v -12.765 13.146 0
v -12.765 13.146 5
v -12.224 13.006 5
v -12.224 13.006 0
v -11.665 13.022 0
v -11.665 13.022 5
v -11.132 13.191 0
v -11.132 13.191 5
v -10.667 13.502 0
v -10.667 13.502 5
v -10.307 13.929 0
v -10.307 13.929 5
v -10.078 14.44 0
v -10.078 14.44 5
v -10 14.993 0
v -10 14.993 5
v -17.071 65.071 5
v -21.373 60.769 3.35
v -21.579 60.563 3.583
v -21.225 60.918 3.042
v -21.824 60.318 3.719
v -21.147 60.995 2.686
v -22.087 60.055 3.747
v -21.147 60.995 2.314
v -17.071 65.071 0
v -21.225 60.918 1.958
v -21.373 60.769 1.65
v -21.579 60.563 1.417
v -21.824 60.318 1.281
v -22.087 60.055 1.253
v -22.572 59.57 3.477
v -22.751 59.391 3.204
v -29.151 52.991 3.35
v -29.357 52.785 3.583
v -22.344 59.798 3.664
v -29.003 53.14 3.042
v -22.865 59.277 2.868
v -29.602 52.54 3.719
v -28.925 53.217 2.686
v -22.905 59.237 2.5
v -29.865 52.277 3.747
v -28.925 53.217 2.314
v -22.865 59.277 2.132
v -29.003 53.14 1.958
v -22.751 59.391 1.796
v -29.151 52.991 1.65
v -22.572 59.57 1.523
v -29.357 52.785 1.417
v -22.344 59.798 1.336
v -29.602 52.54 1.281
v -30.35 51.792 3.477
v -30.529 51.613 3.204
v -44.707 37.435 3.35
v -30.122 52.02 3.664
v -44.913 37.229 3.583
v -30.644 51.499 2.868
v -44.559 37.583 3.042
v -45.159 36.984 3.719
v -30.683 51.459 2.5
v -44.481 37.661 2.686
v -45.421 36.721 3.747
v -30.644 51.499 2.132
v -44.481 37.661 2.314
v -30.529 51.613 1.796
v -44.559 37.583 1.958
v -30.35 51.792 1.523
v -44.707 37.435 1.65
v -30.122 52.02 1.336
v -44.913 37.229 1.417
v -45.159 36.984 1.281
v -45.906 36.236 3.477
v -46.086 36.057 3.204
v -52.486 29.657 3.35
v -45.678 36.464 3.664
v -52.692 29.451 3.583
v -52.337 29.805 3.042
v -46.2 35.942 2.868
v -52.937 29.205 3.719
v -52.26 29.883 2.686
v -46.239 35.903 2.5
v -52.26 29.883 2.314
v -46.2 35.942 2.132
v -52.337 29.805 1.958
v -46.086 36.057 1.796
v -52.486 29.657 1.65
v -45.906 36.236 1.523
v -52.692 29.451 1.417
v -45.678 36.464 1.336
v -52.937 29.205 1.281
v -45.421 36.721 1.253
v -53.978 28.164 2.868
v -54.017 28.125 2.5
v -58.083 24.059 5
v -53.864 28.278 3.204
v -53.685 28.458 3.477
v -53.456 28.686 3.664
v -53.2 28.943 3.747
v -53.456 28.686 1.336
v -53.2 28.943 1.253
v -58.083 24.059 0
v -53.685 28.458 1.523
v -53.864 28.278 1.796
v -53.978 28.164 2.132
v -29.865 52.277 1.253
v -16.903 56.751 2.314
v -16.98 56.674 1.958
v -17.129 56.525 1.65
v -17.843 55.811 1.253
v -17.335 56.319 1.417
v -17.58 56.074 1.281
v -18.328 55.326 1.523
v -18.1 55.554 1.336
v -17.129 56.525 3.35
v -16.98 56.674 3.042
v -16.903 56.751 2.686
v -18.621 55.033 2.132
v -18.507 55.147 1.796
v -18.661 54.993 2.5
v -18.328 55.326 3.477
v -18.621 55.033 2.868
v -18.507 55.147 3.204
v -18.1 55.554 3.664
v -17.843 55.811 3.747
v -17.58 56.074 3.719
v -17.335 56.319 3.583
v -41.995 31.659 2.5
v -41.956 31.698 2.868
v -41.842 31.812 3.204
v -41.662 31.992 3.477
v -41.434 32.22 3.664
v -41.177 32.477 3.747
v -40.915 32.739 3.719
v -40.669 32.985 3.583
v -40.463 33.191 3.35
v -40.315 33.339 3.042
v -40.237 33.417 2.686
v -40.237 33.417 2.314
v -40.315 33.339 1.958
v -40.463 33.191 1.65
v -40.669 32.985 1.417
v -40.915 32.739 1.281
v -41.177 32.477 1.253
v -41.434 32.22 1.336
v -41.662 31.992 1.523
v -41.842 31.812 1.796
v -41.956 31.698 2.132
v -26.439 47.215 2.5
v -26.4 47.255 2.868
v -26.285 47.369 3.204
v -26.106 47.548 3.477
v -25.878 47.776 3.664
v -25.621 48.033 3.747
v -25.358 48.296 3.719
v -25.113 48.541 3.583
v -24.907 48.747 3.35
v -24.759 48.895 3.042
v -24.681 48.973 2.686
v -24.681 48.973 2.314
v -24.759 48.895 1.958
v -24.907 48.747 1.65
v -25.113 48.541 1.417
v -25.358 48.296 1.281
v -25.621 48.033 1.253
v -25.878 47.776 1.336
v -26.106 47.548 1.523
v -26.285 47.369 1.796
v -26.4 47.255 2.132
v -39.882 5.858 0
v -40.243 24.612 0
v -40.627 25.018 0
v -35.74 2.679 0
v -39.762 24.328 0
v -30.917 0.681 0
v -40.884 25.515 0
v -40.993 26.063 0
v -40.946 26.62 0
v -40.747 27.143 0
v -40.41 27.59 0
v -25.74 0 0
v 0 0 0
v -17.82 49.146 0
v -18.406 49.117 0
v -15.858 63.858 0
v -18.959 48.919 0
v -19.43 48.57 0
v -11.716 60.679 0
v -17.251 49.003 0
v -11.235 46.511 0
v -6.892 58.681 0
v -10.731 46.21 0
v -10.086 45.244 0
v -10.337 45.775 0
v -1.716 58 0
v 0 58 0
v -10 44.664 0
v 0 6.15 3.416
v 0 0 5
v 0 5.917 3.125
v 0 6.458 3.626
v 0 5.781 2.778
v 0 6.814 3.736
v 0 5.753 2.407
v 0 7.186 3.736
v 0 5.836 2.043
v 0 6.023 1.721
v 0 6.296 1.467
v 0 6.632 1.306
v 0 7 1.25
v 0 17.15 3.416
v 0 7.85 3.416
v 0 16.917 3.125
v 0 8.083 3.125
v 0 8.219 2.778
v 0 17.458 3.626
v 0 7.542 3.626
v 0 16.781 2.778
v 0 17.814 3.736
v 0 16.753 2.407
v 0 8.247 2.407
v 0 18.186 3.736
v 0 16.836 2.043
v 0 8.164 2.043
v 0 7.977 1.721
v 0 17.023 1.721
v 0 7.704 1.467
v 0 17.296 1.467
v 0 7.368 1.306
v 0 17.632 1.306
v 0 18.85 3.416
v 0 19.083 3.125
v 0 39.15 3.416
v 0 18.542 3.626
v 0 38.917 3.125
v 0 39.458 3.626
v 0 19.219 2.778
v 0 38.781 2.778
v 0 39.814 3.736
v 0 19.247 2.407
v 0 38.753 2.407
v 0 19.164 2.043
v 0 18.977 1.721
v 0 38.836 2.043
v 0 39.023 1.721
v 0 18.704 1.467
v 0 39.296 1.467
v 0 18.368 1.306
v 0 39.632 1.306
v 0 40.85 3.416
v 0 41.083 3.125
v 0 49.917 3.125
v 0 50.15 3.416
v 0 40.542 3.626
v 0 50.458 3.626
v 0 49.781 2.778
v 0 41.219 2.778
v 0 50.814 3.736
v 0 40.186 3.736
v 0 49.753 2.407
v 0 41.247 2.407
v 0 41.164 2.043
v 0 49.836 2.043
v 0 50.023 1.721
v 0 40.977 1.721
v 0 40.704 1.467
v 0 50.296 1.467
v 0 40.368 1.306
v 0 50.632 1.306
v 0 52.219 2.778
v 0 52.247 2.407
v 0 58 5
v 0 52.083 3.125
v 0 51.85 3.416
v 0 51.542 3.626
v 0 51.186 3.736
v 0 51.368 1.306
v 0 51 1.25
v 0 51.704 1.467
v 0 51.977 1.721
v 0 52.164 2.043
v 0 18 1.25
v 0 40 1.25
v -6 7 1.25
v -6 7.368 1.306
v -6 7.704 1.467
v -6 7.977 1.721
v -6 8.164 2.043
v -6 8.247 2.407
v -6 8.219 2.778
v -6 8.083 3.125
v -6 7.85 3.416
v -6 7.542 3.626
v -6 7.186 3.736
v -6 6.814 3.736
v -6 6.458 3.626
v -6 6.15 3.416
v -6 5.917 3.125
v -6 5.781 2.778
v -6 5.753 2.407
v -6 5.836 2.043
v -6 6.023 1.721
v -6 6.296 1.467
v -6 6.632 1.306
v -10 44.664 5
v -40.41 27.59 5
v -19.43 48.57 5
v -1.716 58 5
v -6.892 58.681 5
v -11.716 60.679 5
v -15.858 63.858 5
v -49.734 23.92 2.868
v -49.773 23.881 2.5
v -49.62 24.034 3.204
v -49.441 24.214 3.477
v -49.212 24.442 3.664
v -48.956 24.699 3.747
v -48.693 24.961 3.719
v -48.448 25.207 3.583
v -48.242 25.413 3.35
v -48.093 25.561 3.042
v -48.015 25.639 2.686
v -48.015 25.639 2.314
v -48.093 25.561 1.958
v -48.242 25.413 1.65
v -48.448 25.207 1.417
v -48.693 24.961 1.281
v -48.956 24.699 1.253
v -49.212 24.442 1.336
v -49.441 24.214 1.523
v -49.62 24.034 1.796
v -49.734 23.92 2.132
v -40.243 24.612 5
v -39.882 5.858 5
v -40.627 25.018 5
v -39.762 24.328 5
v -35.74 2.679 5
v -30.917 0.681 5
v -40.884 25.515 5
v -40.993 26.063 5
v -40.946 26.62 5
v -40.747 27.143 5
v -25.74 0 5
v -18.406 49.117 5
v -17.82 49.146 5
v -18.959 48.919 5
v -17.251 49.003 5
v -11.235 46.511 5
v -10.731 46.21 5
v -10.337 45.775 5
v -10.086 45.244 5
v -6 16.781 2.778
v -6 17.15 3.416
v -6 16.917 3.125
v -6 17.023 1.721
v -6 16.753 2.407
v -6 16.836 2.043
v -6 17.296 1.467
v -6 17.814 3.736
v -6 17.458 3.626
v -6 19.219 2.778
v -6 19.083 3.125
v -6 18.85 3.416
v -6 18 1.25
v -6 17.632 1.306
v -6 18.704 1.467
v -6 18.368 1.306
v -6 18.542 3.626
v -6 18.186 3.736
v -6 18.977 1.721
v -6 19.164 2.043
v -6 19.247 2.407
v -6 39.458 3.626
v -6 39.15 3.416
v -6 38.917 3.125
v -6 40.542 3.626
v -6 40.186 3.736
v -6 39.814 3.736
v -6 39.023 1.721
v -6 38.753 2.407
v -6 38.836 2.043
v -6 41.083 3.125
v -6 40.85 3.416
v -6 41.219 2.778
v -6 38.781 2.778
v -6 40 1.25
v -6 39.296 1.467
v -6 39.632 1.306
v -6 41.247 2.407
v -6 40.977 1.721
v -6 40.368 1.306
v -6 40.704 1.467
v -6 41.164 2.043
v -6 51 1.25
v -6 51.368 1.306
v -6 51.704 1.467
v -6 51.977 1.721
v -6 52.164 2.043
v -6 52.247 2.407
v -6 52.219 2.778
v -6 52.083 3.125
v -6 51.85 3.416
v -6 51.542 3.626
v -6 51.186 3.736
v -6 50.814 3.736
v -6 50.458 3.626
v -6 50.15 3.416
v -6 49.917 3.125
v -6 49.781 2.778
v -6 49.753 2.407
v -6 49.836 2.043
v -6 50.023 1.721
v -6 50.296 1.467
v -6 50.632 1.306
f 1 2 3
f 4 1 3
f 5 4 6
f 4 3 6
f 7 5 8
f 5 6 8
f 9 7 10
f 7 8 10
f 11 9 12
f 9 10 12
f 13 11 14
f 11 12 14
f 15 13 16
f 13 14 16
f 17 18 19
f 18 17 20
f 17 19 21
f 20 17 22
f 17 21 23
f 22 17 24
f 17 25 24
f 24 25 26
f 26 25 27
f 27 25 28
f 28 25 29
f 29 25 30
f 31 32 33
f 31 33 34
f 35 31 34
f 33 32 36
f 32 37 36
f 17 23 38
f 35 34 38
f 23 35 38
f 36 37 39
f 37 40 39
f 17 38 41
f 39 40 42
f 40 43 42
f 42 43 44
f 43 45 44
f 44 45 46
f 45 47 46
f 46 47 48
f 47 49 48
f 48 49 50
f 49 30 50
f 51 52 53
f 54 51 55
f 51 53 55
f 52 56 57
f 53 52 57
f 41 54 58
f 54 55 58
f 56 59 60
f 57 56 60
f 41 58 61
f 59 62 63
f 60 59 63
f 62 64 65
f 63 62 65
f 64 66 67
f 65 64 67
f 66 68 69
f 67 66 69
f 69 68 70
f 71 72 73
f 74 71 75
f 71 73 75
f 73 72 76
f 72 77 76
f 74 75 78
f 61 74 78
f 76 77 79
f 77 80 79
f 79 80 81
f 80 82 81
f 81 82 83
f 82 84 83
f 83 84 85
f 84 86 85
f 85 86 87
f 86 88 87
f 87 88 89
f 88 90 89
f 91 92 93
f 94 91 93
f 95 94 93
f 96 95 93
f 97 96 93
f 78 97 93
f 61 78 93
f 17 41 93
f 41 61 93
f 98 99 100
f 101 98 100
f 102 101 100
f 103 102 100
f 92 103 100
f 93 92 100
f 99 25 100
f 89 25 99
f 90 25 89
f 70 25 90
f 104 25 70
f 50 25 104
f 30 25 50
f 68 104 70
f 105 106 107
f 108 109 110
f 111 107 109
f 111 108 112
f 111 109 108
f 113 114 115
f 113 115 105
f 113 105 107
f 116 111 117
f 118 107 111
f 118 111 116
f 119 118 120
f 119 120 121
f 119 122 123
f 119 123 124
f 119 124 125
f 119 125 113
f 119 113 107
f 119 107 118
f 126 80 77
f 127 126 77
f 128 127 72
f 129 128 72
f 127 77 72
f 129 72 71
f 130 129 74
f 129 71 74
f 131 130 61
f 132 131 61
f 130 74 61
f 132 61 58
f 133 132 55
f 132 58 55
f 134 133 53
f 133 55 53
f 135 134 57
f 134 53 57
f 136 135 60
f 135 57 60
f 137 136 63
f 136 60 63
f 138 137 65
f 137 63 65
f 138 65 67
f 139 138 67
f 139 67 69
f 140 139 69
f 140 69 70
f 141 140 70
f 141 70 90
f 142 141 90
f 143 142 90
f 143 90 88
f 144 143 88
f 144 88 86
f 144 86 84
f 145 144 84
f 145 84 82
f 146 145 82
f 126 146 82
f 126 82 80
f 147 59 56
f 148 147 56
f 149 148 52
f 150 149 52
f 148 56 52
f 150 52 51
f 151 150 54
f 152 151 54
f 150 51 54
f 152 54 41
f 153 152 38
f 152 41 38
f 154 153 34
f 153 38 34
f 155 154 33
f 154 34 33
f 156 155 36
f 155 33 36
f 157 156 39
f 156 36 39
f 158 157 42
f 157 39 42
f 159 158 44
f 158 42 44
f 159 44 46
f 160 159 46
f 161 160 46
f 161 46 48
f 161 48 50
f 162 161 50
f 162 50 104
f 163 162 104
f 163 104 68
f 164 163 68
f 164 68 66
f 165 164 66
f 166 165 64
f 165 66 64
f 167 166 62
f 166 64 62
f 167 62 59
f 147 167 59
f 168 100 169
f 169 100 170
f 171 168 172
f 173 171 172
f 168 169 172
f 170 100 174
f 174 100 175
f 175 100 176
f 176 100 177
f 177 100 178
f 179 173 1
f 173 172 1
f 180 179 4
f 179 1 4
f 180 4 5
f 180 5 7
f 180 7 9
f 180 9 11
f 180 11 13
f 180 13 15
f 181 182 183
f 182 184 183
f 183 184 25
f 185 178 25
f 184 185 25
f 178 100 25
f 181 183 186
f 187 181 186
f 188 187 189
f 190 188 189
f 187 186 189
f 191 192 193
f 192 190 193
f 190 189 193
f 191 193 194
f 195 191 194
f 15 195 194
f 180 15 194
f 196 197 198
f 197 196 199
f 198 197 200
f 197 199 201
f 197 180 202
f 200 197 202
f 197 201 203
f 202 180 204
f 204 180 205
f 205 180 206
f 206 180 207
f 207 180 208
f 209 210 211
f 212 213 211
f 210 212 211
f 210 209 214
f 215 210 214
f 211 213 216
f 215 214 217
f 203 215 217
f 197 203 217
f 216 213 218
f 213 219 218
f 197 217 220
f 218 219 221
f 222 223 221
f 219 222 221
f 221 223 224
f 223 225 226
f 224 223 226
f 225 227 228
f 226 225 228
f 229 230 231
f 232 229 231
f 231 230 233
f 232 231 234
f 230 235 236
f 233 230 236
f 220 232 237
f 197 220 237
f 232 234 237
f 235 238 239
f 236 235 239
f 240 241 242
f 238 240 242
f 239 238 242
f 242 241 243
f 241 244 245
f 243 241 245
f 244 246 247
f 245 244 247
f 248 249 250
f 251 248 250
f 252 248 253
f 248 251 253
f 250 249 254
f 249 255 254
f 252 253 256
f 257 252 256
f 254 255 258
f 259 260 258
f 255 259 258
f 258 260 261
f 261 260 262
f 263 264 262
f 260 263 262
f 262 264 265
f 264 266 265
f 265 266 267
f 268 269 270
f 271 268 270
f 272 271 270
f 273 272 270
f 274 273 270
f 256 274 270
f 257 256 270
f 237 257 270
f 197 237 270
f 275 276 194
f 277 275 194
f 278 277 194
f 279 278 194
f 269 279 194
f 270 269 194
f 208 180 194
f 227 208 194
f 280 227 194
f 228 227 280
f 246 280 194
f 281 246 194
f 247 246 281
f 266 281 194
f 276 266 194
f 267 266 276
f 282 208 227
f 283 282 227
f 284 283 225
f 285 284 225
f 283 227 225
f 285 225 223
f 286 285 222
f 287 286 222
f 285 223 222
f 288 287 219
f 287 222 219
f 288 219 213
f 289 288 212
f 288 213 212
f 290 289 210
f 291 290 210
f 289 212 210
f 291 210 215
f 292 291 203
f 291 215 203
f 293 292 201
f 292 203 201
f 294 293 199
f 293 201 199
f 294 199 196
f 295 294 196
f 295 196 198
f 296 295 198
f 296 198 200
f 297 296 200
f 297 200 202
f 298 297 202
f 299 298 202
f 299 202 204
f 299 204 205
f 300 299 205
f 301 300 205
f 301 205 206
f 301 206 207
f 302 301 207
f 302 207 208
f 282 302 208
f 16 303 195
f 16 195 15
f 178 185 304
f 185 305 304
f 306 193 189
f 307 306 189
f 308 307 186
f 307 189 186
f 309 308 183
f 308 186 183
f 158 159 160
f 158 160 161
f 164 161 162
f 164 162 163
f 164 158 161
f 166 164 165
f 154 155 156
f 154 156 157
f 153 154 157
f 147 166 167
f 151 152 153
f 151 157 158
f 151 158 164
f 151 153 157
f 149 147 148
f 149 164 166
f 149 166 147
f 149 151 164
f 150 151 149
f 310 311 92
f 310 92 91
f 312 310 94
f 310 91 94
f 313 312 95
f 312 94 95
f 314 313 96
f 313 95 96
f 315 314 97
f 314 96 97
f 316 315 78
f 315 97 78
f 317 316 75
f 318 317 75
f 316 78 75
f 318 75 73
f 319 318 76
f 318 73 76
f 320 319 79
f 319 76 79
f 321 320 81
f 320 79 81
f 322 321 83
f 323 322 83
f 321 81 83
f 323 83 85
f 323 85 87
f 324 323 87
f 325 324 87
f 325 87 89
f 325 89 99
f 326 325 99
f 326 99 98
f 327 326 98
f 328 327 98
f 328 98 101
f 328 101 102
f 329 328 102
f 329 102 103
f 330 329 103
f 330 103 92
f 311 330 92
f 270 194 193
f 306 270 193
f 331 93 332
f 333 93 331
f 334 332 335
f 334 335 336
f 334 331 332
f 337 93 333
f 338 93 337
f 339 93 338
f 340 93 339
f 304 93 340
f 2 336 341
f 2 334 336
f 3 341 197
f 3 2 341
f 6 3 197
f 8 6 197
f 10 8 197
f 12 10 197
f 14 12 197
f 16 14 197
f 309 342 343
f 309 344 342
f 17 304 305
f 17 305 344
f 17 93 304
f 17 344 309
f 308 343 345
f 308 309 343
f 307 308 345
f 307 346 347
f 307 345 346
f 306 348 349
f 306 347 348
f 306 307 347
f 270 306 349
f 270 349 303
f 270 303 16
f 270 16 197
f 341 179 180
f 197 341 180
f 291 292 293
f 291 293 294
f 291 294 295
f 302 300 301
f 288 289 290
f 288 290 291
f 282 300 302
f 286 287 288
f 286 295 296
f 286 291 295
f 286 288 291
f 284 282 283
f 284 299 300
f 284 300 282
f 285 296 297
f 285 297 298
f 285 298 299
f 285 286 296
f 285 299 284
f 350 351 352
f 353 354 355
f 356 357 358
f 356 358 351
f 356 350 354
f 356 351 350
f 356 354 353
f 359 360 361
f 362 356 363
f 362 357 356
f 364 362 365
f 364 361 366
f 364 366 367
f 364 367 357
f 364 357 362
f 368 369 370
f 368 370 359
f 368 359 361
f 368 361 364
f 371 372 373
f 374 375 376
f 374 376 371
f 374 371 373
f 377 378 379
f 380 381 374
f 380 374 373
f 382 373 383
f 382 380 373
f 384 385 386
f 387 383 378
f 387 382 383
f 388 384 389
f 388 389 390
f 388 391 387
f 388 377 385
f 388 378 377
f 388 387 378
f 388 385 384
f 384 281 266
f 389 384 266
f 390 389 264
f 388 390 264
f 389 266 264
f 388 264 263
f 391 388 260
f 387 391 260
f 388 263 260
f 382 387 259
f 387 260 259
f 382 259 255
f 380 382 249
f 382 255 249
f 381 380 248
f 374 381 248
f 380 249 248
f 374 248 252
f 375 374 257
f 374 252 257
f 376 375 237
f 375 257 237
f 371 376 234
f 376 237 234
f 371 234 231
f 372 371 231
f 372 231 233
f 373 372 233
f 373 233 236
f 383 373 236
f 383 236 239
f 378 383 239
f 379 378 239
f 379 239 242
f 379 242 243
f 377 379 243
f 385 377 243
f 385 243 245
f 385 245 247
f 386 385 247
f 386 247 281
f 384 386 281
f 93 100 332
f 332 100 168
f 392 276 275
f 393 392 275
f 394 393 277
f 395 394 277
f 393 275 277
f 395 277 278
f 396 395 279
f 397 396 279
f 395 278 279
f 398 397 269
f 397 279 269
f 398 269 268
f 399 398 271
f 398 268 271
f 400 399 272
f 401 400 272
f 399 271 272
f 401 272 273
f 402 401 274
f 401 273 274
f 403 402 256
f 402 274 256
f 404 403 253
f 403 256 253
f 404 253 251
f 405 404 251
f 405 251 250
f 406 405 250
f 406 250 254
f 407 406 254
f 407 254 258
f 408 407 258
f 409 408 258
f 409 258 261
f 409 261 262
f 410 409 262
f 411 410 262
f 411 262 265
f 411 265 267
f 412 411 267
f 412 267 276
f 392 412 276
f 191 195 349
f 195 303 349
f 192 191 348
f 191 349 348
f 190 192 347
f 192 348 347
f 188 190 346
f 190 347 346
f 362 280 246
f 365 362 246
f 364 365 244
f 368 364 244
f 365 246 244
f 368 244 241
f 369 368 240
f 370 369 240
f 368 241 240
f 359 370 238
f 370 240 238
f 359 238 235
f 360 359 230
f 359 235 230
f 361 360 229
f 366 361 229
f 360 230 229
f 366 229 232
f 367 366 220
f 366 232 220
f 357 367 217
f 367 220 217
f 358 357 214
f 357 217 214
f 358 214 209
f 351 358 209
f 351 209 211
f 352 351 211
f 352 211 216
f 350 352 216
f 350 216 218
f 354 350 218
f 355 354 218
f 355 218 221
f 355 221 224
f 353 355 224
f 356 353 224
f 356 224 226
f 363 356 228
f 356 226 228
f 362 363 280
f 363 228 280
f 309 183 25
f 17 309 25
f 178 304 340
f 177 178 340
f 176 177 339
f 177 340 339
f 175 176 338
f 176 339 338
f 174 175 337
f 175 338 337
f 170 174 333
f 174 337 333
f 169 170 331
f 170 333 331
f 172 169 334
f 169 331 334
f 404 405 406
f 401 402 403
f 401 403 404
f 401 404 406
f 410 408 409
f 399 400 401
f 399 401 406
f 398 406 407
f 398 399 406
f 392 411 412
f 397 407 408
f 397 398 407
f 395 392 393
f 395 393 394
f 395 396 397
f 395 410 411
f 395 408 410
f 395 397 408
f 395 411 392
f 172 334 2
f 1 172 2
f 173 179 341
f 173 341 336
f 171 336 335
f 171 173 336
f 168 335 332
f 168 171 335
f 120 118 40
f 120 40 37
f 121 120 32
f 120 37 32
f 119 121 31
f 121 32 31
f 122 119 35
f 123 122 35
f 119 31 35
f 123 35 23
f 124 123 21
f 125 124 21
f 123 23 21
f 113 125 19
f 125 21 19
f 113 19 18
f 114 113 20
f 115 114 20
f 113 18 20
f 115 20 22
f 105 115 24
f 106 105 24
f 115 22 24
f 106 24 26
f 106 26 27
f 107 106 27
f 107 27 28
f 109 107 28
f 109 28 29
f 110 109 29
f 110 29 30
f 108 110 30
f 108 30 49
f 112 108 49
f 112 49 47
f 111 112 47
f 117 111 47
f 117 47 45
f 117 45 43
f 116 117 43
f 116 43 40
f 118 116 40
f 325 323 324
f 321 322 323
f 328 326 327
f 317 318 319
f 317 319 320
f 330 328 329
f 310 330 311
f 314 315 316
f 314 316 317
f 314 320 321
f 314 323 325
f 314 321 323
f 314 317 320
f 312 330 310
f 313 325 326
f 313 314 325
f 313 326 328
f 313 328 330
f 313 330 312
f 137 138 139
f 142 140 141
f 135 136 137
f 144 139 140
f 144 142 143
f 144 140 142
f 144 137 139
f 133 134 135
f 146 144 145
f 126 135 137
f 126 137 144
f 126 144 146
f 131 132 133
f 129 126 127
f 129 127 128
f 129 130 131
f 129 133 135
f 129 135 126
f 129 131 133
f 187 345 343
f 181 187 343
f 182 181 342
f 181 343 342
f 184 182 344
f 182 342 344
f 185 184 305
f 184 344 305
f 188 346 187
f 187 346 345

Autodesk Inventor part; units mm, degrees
ref_plane "YZ Plane" through (0, 0, 0) normal (1, 0, 0) x (0, 1, 0)
ref_plane "XZ Plane" through (0, 0, 0) normal (0, 1, 0) x (-1, 0, 0)
ref_plane "XY Plane" through (0, 0, 0) normal (0, 0, 1) x (1, 0, 0)
sketch "스케치1" plane through (0, 0, 0) normal (0, 0, 1) x (1, 0, 0)
  line L0 (0, 0) -> (0, 58)
  line L1 (0, 58) -> (-1.7157, 58)
  line L2 (-15.8579, 63.8579) -> (-17.0711, 65.0711)
  line L3 (-10, 58) -> (-8.2843, 58) construction
  line L4 (-17.0711, 65.0711) -> (-58.0833, 24.0589)
  line L5 (-58.0833, 24.0589) -> (-39.8823, 5.8579)
  line L6 (-25.7401, 0) -> (0, 0)
  arc A0 (-15.8579, 63.8579) -> (-1.7157, 58) centre (-1.7157, 78) ccw
  arc A1 (-39.8823, 5.8579) -> (-25.7401, 0) centre (-25.7401, 20) ccw
  point P0 (-34.0244, 0)
  dimension "d4" = 58
  dimension "d5" = 10
  dimension "d7" = 10
  dimension "d8" = 135
  dimension "d11" = 58
  dimension "d14" = 135
  dimension "d16" = 20
  dimension "d53" = 45
extrude "돌출1" add sketch "스케치1" along normal blind 5
sketch "스케치3" plane through (0, 0, 5) normal (0, 0, 1) x (1, 0, 0)
  line L0 (-19.4302, 48.5698) -> (-40.4104, 27.5896)
  line L1 (-17.0711, 65.0711) -> (-58.0833, 24.0589) projected
  line L2 (-58.0833, 24.0589) -> (-39.8823, 5.8579) projected
  line L3 (-15.8579, 63.8579) -> (-17.0711, 65.0711) projected
  line L4 (-10, 44.6636) -> (-10, 14.9932)
  line L5 (0, 58) -> (-1.7157, 58) projected
  line L6 (-25.7401, 0) -> (0, 0) projected
  line L7 (0, 0) -> (0, 58) projected
  line L8 (-39.7615, 24.3276) -> (-12.7654, 13.1455)
  line L9 (-11.2346, 46.5114) -> (-17.2506, 49.0033)
  arc A0 (-40.4104, 27.5896) -> (-39.7615, 24.3276) centre (-38.9962, 26.1754) ccw
  arc A1 (-12.7654, 13.1455) -> (-10, 14.9932) centre (-12, 14.9932) ccw
  arc A2 (-10, 44.6636) -> (-11.2346, 46.5114) centre (-12, 44.6636) ccw
  arc A3 (-17.2506, 49.0033) -> (-19.4302, 48.5698) centre (-18.016, 47.1556) ccw
  point P0 (-43.9411, 24.0589)
  point P1 (-36.8701, 16.9878)
  point P2 (-10, 10)
  point P3 (-20, 10)
  point P4 (-18.4853, 49.5147)
  point P5 (-42.5269, 25.4731)
  point P6 (-10, 46)
  point P7 (-10, 12)
  dimension "d17" = 10
  dimension "d20" = 10
  dimension "d23" = 10
  dimension "d24" = 10
  dimension "d52" = 2
extrude "돌출2" cut sketch "스케치3" against normal blind 6
sketch "스케치4" plane through (-58.0833, 24.0589, 0) normal (-0.7071, 0.7071, 0) x (-0.7071, -0.7071, 0)
  line L0 (-58, 0) -> (-58, 5) projected
  line L1 (-58, 2.5) -> (0, 2.5) construction
  line L2 (0, 0) -> (0, 5) projected
  circle A0 centre (-51, 2.5) radius 1.25
  circle A1 centre (-40, 2.5) radius 1.25
  circle A2 centre (-18, 2.5) radius 1.25
  circle A3 centre (-7, 2.5) radius 1.25
  point P0 (-24.0589, 0)
  dimension "d29" = 2.5
  dimension "d30" = 2.5
  dimension "d31" = 2.5
  dimension "d32" = 2.5
  dimension "d33" = 7
  dimension "d34" = 11
  dimension "d35" = 22
  dimension "d36" = 11
extrude "돌출3" cut sketch "스케치4" against normal blind 6
sketch "스케치5" plane through (0, 0, 0) normal (1, 0, 0) x (0, 0, -1)
  line L0 (0, 58) -> (-5, 58) projected
  line L1 (-2.5, 58) -> (-2.5, 17.6545) construction
  circle A0 centre (-2.5, 51) radius 1.25
  circle A1 centre (-2.5, 40) radius 1.25
  circle A2 centre (-2.5, 18) radius 1.25
  circle A3 centre (-2.5, 7) radius 1.25
  line L2 (0, 0) -> (-5, 0) projected
  dimension "d39" = 2.5
  dimension "d40" = 2.5
  dimension "d41" = 2.5
  dimension "d42" = 2.5
  dimension "d43" = 7
  dimension "d44" = 11
  dimension "d45" = 11
  dimension "d47" = 7
extrude "돌출4" cut sketch "스케치5" against normal blind 6
sketch "스케치6" plane through (0, 0, 0) normal (1, 0, 0) x (0, 0, -1)
  circle A0 centre (-2.5, 40) radius 1.25 projected
  circle A1 centre (-2.5, 18) radius 1.25 projected
  circle A2 centre (-2.5, 51) radius 1.25 projected
  circle A3 centre (-2.5, 7) radius 1.25 projected
  line L0 (0, 0) -> (0, 58) projected
  line L1 (0, 58) -> (-5, 58) projected
  line L2 (-5, 0) -> (-5, 58) projected
  line L3 (0, 0) -> (-5, 0) projected
properties part number "조인트3_박스사이드_6T" material "알루미늄 6061"
